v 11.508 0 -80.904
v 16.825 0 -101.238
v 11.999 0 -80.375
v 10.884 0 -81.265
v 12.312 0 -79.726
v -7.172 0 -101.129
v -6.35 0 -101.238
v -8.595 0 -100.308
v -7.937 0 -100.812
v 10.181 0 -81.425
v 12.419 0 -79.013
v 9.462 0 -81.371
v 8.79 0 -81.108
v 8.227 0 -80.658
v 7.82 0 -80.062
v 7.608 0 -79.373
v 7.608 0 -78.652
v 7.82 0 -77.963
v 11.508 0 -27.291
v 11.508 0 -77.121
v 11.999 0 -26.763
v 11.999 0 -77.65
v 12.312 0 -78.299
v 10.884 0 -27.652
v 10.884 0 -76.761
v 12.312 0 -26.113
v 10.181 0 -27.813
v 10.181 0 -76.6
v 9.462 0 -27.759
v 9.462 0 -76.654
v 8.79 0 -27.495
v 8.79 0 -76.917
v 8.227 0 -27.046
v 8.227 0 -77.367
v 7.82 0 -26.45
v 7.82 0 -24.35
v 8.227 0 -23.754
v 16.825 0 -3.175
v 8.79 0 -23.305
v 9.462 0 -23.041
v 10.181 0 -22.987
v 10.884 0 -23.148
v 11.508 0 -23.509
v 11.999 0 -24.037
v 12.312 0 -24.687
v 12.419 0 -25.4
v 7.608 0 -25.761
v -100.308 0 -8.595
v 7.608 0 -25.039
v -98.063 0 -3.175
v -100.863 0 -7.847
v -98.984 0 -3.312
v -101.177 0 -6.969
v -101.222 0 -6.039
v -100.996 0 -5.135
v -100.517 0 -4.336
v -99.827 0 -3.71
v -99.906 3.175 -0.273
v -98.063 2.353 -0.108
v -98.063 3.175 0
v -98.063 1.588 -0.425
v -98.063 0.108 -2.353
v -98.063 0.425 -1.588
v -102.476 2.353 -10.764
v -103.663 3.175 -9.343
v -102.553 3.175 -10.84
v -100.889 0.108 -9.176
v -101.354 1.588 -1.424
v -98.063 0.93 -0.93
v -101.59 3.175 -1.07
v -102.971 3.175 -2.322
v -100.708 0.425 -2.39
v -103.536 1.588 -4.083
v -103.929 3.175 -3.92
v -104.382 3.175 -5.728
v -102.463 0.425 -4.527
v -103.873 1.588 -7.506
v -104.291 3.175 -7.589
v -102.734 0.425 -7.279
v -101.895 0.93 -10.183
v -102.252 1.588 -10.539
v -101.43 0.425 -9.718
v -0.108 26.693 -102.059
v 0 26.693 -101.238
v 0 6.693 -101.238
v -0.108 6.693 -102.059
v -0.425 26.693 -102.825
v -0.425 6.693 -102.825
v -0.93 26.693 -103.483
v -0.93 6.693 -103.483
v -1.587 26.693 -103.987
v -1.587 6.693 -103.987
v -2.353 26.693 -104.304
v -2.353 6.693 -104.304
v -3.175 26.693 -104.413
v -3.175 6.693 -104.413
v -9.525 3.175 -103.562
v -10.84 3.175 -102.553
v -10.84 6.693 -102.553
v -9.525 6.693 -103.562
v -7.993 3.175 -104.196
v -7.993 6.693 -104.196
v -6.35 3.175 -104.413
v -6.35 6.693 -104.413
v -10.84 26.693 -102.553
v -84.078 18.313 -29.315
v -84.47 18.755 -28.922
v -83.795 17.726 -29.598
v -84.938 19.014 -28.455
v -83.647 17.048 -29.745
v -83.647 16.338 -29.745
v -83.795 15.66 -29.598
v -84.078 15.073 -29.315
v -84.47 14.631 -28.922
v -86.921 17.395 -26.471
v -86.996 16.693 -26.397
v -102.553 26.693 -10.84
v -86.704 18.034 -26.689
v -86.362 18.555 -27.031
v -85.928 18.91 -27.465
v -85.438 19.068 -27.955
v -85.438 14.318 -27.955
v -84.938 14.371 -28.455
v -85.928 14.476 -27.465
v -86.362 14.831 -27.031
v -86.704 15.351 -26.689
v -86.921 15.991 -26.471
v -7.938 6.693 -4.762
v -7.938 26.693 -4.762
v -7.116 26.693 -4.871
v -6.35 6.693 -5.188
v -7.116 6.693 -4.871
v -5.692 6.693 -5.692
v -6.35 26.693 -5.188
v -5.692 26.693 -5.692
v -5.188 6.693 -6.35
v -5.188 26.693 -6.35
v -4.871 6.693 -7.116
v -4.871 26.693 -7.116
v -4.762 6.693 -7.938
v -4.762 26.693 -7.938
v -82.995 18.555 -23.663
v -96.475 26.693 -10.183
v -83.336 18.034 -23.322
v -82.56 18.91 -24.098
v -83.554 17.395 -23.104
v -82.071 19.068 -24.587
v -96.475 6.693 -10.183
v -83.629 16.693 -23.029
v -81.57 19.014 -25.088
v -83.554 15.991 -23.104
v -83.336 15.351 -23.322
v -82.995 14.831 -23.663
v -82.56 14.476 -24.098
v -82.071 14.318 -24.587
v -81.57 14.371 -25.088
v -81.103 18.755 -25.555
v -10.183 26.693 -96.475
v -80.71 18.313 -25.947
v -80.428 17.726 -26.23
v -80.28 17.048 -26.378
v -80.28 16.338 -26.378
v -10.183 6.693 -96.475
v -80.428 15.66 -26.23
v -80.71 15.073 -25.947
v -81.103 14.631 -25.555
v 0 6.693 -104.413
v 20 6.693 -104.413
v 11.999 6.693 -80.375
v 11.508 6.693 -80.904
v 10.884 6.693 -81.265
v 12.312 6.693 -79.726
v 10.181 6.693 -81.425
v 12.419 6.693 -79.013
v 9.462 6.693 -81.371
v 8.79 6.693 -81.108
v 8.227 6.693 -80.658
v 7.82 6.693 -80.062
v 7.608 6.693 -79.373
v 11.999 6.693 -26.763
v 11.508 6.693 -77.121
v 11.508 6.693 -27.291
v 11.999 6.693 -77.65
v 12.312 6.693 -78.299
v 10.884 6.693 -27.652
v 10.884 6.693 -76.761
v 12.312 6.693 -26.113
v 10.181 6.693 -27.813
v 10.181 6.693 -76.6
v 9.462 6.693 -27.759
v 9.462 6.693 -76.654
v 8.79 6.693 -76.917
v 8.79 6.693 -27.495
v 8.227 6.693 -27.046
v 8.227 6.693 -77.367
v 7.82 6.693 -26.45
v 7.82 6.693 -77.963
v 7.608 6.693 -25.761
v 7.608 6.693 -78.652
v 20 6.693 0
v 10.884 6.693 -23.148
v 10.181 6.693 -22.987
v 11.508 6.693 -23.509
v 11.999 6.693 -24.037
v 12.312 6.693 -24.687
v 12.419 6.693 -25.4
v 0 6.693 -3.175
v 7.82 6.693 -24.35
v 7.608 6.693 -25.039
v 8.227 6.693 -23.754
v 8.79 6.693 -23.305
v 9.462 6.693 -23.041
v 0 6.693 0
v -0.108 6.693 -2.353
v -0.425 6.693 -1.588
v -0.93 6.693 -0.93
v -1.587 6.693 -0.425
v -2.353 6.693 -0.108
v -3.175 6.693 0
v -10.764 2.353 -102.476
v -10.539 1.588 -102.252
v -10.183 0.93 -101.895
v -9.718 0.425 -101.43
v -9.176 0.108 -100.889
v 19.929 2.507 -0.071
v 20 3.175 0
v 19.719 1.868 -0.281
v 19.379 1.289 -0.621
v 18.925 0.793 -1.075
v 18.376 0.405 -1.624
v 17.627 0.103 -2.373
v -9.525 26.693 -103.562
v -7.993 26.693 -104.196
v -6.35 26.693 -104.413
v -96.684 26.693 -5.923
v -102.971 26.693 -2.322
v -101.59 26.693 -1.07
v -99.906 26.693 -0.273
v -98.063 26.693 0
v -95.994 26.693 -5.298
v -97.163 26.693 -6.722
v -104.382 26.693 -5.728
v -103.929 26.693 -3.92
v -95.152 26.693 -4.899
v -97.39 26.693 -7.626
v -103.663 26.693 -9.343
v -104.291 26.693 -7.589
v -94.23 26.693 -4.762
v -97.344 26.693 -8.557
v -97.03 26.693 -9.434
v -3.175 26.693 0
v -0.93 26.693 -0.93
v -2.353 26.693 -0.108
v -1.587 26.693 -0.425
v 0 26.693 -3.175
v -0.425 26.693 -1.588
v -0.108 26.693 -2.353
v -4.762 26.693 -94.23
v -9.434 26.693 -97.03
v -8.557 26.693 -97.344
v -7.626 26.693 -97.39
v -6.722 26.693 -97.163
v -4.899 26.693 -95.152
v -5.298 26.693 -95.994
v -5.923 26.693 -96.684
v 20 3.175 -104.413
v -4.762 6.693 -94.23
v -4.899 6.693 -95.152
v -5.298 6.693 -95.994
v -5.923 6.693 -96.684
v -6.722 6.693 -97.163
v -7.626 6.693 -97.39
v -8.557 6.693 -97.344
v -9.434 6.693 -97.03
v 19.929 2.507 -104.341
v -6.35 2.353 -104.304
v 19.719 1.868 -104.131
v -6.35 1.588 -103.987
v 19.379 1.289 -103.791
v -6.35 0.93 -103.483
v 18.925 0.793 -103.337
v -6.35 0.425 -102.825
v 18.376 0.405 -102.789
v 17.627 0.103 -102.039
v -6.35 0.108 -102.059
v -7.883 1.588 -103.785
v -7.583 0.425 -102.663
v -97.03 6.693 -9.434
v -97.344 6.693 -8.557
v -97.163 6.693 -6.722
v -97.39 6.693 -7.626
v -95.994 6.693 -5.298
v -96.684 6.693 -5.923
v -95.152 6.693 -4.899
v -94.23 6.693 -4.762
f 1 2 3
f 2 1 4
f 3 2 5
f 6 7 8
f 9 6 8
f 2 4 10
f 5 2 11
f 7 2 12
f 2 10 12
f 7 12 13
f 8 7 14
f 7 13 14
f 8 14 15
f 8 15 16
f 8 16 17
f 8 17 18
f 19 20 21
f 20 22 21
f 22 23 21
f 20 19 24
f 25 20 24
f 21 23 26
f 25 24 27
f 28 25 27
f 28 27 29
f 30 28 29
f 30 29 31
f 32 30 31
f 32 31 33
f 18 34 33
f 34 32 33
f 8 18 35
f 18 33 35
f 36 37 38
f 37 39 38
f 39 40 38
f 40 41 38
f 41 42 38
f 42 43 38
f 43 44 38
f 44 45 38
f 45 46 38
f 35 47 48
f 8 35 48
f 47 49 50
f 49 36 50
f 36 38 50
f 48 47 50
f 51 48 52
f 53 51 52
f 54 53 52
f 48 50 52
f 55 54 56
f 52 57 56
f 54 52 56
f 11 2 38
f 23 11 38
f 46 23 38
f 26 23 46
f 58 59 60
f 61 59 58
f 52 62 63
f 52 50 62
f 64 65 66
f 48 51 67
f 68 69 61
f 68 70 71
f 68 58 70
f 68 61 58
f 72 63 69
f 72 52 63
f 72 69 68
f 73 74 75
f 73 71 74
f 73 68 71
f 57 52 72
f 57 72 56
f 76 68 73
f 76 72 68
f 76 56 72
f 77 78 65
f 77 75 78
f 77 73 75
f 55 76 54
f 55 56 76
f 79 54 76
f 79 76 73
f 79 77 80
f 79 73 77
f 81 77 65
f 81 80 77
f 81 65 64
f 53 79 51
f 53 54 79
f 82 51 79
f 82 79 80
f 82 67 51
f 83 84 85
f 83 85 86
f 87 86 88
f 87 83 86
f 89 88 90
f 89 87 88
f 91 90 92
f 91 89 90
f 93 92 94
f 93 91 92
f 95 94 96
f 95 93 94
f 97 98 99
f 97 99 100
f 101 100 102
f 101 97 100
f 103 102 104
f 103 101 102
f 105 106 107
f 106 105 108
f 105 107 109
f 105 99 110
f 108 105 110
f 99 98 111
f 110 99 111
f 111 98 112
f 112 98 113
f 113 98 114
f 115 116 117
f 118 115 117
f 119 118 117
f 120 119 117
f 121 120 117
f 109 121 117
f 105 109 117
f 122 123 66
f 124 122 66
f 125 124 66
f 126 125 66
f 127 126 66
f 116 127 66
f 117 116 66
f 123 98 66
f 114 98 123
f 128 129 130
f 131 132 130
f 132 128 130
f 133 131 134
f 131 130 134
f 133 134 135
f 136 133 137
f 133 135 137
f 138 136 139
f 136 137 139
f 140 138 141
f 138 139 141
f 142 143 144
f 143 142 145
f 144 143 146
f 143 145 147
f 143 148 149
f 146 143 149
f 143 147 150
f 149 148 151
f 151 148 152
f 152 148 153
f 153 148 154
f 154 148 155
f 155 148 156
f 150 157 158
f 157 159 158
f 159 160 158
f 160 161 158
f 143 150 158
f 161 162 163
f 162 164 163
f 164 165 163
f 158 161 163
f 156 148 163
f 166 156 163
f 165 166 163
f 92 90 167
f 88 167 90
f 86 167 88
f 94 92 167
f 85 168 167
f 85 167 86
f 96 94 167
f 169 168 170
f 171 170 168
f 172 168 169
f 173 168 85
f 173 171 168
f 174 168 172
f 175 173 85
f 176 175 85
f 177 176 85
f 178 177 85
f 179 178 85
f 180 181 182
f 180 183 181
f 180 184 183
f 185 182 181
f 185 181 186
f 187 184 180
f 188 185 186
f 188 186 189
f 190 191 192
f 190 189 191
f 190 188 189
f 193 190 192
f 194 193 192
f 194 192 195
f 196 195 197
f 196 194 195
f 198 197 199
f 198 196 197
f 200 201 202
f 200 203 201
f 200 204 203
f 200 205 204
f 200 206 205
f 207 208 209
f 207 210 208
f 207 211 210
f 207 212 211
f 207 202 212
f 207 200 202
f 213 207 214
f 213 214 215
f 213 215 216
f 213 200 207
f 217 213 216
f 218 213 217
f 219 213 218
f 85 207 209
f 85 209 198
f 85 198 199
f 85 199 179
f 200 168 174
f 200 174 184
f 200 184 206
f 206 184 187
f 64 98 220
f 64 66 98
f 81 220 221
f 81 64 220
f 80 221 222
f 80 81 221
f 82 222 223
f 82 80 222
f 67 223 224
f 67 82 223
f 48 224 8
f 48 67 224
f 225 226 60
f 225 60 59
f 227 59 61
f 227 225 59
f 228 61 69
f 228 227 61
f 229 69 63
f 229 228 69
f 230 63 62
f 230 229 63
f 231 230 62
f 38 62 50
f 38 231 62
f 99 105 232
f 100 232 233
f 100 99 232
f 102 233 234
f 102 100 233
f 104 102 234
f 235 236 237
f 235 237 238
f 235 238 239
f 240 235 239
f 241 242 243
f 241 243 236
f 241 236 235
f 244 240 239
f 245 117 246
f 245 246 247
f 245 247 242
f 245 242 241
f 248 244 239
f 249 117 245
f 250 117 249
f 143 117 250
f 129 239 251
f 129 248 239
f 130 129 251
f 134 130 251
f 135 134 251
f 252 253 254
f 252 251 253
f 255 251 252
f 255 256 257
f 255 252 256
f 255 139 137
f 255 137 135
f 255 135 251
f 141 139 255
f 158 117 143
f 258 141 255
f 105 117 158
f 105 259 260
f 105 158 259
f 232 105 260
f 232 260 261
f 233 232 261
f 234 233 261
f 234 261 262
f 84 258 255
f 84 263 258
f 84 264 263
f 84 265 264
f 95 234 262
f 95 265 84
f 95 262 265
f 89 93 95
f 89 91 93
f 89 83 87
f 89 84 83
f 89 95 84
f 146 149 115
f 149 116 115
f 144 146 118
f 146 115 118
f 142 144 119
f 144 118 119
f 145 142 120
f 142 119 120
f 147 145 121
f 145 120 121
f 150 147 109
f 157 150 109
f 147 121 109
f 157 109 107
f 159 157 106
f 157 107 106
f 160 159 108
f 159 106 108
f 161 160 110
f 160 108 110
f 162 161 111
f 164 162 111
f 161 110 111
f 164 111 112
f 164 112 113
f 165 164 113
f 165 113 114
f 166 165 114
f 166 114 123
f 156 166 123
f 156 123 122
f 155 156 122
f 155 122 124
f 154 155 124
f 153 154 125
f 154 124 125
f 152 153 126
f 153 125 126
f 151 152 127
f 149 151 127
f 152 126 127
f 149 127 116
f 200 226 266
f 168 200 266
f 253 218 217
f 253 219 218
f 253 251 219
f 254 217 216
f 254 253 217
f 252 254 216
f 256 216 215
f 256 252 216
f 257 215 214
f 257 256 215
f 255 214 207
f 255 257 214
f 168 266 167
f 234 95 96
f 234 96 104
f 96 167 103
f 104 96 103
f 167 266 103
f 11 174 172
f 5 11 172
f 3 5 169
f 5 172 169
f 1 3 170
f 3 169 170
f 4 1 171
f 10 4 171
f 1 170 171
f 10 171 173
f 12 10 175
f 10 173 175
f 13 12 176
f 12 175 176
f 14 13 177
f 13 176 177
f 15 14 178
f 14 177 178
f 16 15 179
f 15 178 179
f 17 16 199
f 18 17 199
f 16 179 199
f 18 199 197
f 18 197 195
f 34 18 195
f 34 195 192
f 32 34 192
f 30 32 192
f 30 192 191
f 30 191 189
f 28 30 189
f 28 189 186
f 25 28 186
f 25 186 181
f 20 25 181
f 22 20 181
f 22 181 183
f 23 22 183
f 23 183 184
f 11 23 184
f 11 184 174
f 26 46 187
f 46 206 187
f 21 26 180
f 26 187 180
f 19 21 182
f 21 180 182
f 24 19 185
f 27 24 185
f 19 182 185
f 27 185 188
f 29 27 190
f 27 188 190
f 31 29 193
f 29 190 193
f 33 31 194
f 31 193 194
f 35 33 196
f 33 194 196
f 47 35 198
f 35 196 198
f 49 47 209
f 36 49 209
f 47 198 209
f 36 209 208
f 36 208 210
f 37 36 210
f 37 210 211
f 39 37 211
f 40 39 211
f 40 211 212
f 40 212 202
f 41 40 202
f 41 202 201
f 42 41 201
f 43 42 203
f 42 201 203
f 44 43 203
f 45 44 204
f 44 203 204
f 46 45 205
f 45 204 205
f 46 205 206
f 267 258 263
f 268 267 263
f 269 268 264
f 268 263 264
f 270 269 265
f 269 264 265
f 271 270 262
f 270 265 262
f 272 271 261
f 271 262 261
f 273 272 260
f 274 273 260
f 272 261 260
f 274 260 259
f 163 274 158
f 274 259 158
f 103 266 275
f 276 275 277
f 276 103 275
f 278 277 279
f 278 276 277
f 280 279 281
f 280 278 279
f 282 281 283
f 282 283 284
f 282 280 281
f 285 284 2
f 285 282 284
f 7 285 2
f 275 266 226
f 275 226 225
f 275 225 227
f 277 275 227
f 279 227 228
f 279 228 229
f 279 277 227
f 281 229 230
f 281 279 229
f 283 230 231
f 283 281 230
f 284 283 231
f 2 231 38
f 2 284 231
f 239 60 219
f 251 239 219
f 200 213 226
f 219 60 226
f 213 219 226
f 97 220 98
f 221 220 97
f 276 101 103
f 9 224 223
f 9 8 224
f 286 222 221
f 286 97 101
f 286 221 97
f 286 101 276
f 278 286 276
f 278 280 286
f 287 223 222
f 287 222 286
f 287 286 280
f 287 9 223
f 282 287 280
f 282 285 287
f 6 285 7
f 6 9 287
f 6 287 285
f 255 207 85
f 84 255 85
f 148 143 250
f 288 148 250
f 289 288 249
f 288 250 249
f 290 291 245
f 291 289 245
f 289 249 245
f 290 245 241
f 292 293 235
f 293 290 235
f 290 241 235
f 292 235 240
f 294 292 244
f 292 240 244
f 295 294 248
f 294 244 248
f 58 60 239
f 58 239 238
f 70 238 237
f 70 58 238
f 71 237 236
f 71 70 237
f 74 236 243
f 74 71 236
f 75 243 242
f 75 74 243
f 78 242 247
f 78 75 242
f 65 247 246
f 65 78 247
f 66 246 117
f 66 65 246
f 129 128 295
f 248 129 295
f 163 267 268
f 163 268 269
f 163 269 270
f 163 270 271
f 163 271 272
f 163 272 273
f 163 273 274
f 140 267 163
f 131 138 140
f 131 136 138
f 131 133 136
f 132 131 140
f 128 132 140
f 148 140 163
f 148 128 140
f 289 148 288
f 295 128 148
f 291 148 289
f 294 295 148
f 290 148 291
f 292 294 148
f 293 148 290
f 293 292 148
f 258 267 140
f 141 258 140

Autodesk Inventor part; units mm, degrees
ref_plane "YZ Plane" through (0, 0, 0) normal (1, 0, 0) x (0, 1, 0)
ref_plane "XZ Plane" through (0, 0, 0) normal (0, 1, 0) x (-1, 0, 0)
ref_plane "XY Plane" through (0, 0, 0) normal (0, 0, 1) x (1, 0, 0)
sketch "Sketch1" plane through (0, 0, 0) normal (0, 1, 0) x (-1, 0, 0)
  line L0 (0, -6.35) -> (0, -98.0626)
  line L1 (10.8401, -102.5527) -> (102.5527, -10.8401)
  line L2 (98.0626, 0) -> (6.35, 0)
  arc A0 (102.5527, -10.8401) -> (98.0626, 0) centre (98.0626, -6.35) ccw
  arc A1 (0, -98.0626) -> (10.8401, -102.5527) centre (6.35, -98.0626) ccw
  arc A2 (6.35, 0) -> (0, -6.35) centre (6.35, -6.35) ccw
  line L3 (0, 0) -> (-20, 0)
  line L4 (-20, 0) -> (-20, -104.4126)
  line L5 (-20, -104.4126) -> (0, -104.4126)
  line L6 (0, -104.4126) -> (0, 0)
  line L7 (0, 0) -> (6.35, 0)
  line L8 (0, -104.4126) -> (6.35, -104.4126)
  point P0 (113.3929, 0)
  dimension "d0" = 113.3929
  dimension "d1" = 6.35
  dimension "d8" = 20
extrude "Extrusion1" add sketch "Sketch1" along normal blind 6.6929
sketch "Sketch2" plane through (0, 6.6929, 0) normal (0, 1, 0) x (1, 0, 0)
  arc A0 (-6.35, 104.4126) -> (-10.8401, 102.5527) centre (-6.35, 98.0626) ccw projected
  line L0 (-10.8401, 102.5527) -> (-102.5527, 10.8401) projected
  arc A1 (-102.5527, 10.8401) -> (-98.0626, 0) centre (-98.0626, 6.35) ccw projected
  line L1 (-4.7625, 4.7625) -> (-104.211, 4.7625)
  line L2 (-101.8952, 4.7625) -> (-4.7625, 101.8952)
  line L3 (-4.7625, 104.211) -> (-4.7625, 4.7625)
  line L4 (-98.0626, 0) -> (20, 0) projected
  line L5 (20, 0) -> (20, 104.4126) projected
  line L6 (20, 104.4126) -> (-6.35, 104.4126) projected
  line L7 (0, 0) -> (0, 104.4126)
  point P0 (0, 0)
extrude "Extrusion2" add sketch "Sketch2" along normal blind 20 contours L6 L7 L4 A1 L0 A0
sketch "Sketch3" plane through (0, 6.6929, 0) normal (0, 1, 0) x (1, 0, 0)
  circle A0 centre (10, 25.4) radius 2.4193
  circle A1 centre (10, 79.0126) radius 2.4193
  line L0 (20, 0) -> (20, 104.4126) projected
  line L1 (0, 0) -> (20, 0) projected
  dimension "d9" = 10
  dimension "d10" = 25.4
  dimension "d11" = 25.4
  dimension "d12" = 4.8387
extrude "Extrusion3" cut sketch "Sketch3" against normal blind 12.954
sketch "Sketch5" plane through (-102.5527, 0, -10.8401) normal (-0.7071068, 0, -0.7071068) x (-0.7071068, 0, 0.7071068)
  circle A0 centre (-24.3815, 16.6929) radius 2.3813
  line L0 (-138.6815, 6.6929) -> (-138.6815, 26.6929) projected
  line L1 (-129.7012, 26.6929) -> (0, 26.6929) projected
  line L2 (-129.7012, 0) -> (0, 0) projected
  line L3 (-152.8236, 6.6929) -> (-138.6815, 6.6929) projected
  line L4 (-78.9927, 0) -> (-152.8236, 0) projected
  point P0 (-64.8506, 0)
  dimension "d15" = 114.3
  dimension "d17" = 16.6929
  dimension "d18" = 6.6929
  dimension "d19" = 4.7625
extrude "Extrusion4" cut sketch "Sketch5" against normal up to surface (4.7625 mm away)
fillet "Fillet1" radius 3.175 11 edges at (-4.7625, 16.6929, -4.7625) (-101.8952, 16.6929, -4.7625) (-4.7625, 16.6929, -101.8952) (0, 16.6929, -104.4126) (-8.78, 0, -103.9292) (-56.6964, 0, -56.6964) (-103.9292, 0, -3.92) (-39.0313, 0, 0) (6.825, 0, -104.4126) (20, 0, -52.2063) (0, 16.6929, 0)
properties part number "Part1_3DPrint"
